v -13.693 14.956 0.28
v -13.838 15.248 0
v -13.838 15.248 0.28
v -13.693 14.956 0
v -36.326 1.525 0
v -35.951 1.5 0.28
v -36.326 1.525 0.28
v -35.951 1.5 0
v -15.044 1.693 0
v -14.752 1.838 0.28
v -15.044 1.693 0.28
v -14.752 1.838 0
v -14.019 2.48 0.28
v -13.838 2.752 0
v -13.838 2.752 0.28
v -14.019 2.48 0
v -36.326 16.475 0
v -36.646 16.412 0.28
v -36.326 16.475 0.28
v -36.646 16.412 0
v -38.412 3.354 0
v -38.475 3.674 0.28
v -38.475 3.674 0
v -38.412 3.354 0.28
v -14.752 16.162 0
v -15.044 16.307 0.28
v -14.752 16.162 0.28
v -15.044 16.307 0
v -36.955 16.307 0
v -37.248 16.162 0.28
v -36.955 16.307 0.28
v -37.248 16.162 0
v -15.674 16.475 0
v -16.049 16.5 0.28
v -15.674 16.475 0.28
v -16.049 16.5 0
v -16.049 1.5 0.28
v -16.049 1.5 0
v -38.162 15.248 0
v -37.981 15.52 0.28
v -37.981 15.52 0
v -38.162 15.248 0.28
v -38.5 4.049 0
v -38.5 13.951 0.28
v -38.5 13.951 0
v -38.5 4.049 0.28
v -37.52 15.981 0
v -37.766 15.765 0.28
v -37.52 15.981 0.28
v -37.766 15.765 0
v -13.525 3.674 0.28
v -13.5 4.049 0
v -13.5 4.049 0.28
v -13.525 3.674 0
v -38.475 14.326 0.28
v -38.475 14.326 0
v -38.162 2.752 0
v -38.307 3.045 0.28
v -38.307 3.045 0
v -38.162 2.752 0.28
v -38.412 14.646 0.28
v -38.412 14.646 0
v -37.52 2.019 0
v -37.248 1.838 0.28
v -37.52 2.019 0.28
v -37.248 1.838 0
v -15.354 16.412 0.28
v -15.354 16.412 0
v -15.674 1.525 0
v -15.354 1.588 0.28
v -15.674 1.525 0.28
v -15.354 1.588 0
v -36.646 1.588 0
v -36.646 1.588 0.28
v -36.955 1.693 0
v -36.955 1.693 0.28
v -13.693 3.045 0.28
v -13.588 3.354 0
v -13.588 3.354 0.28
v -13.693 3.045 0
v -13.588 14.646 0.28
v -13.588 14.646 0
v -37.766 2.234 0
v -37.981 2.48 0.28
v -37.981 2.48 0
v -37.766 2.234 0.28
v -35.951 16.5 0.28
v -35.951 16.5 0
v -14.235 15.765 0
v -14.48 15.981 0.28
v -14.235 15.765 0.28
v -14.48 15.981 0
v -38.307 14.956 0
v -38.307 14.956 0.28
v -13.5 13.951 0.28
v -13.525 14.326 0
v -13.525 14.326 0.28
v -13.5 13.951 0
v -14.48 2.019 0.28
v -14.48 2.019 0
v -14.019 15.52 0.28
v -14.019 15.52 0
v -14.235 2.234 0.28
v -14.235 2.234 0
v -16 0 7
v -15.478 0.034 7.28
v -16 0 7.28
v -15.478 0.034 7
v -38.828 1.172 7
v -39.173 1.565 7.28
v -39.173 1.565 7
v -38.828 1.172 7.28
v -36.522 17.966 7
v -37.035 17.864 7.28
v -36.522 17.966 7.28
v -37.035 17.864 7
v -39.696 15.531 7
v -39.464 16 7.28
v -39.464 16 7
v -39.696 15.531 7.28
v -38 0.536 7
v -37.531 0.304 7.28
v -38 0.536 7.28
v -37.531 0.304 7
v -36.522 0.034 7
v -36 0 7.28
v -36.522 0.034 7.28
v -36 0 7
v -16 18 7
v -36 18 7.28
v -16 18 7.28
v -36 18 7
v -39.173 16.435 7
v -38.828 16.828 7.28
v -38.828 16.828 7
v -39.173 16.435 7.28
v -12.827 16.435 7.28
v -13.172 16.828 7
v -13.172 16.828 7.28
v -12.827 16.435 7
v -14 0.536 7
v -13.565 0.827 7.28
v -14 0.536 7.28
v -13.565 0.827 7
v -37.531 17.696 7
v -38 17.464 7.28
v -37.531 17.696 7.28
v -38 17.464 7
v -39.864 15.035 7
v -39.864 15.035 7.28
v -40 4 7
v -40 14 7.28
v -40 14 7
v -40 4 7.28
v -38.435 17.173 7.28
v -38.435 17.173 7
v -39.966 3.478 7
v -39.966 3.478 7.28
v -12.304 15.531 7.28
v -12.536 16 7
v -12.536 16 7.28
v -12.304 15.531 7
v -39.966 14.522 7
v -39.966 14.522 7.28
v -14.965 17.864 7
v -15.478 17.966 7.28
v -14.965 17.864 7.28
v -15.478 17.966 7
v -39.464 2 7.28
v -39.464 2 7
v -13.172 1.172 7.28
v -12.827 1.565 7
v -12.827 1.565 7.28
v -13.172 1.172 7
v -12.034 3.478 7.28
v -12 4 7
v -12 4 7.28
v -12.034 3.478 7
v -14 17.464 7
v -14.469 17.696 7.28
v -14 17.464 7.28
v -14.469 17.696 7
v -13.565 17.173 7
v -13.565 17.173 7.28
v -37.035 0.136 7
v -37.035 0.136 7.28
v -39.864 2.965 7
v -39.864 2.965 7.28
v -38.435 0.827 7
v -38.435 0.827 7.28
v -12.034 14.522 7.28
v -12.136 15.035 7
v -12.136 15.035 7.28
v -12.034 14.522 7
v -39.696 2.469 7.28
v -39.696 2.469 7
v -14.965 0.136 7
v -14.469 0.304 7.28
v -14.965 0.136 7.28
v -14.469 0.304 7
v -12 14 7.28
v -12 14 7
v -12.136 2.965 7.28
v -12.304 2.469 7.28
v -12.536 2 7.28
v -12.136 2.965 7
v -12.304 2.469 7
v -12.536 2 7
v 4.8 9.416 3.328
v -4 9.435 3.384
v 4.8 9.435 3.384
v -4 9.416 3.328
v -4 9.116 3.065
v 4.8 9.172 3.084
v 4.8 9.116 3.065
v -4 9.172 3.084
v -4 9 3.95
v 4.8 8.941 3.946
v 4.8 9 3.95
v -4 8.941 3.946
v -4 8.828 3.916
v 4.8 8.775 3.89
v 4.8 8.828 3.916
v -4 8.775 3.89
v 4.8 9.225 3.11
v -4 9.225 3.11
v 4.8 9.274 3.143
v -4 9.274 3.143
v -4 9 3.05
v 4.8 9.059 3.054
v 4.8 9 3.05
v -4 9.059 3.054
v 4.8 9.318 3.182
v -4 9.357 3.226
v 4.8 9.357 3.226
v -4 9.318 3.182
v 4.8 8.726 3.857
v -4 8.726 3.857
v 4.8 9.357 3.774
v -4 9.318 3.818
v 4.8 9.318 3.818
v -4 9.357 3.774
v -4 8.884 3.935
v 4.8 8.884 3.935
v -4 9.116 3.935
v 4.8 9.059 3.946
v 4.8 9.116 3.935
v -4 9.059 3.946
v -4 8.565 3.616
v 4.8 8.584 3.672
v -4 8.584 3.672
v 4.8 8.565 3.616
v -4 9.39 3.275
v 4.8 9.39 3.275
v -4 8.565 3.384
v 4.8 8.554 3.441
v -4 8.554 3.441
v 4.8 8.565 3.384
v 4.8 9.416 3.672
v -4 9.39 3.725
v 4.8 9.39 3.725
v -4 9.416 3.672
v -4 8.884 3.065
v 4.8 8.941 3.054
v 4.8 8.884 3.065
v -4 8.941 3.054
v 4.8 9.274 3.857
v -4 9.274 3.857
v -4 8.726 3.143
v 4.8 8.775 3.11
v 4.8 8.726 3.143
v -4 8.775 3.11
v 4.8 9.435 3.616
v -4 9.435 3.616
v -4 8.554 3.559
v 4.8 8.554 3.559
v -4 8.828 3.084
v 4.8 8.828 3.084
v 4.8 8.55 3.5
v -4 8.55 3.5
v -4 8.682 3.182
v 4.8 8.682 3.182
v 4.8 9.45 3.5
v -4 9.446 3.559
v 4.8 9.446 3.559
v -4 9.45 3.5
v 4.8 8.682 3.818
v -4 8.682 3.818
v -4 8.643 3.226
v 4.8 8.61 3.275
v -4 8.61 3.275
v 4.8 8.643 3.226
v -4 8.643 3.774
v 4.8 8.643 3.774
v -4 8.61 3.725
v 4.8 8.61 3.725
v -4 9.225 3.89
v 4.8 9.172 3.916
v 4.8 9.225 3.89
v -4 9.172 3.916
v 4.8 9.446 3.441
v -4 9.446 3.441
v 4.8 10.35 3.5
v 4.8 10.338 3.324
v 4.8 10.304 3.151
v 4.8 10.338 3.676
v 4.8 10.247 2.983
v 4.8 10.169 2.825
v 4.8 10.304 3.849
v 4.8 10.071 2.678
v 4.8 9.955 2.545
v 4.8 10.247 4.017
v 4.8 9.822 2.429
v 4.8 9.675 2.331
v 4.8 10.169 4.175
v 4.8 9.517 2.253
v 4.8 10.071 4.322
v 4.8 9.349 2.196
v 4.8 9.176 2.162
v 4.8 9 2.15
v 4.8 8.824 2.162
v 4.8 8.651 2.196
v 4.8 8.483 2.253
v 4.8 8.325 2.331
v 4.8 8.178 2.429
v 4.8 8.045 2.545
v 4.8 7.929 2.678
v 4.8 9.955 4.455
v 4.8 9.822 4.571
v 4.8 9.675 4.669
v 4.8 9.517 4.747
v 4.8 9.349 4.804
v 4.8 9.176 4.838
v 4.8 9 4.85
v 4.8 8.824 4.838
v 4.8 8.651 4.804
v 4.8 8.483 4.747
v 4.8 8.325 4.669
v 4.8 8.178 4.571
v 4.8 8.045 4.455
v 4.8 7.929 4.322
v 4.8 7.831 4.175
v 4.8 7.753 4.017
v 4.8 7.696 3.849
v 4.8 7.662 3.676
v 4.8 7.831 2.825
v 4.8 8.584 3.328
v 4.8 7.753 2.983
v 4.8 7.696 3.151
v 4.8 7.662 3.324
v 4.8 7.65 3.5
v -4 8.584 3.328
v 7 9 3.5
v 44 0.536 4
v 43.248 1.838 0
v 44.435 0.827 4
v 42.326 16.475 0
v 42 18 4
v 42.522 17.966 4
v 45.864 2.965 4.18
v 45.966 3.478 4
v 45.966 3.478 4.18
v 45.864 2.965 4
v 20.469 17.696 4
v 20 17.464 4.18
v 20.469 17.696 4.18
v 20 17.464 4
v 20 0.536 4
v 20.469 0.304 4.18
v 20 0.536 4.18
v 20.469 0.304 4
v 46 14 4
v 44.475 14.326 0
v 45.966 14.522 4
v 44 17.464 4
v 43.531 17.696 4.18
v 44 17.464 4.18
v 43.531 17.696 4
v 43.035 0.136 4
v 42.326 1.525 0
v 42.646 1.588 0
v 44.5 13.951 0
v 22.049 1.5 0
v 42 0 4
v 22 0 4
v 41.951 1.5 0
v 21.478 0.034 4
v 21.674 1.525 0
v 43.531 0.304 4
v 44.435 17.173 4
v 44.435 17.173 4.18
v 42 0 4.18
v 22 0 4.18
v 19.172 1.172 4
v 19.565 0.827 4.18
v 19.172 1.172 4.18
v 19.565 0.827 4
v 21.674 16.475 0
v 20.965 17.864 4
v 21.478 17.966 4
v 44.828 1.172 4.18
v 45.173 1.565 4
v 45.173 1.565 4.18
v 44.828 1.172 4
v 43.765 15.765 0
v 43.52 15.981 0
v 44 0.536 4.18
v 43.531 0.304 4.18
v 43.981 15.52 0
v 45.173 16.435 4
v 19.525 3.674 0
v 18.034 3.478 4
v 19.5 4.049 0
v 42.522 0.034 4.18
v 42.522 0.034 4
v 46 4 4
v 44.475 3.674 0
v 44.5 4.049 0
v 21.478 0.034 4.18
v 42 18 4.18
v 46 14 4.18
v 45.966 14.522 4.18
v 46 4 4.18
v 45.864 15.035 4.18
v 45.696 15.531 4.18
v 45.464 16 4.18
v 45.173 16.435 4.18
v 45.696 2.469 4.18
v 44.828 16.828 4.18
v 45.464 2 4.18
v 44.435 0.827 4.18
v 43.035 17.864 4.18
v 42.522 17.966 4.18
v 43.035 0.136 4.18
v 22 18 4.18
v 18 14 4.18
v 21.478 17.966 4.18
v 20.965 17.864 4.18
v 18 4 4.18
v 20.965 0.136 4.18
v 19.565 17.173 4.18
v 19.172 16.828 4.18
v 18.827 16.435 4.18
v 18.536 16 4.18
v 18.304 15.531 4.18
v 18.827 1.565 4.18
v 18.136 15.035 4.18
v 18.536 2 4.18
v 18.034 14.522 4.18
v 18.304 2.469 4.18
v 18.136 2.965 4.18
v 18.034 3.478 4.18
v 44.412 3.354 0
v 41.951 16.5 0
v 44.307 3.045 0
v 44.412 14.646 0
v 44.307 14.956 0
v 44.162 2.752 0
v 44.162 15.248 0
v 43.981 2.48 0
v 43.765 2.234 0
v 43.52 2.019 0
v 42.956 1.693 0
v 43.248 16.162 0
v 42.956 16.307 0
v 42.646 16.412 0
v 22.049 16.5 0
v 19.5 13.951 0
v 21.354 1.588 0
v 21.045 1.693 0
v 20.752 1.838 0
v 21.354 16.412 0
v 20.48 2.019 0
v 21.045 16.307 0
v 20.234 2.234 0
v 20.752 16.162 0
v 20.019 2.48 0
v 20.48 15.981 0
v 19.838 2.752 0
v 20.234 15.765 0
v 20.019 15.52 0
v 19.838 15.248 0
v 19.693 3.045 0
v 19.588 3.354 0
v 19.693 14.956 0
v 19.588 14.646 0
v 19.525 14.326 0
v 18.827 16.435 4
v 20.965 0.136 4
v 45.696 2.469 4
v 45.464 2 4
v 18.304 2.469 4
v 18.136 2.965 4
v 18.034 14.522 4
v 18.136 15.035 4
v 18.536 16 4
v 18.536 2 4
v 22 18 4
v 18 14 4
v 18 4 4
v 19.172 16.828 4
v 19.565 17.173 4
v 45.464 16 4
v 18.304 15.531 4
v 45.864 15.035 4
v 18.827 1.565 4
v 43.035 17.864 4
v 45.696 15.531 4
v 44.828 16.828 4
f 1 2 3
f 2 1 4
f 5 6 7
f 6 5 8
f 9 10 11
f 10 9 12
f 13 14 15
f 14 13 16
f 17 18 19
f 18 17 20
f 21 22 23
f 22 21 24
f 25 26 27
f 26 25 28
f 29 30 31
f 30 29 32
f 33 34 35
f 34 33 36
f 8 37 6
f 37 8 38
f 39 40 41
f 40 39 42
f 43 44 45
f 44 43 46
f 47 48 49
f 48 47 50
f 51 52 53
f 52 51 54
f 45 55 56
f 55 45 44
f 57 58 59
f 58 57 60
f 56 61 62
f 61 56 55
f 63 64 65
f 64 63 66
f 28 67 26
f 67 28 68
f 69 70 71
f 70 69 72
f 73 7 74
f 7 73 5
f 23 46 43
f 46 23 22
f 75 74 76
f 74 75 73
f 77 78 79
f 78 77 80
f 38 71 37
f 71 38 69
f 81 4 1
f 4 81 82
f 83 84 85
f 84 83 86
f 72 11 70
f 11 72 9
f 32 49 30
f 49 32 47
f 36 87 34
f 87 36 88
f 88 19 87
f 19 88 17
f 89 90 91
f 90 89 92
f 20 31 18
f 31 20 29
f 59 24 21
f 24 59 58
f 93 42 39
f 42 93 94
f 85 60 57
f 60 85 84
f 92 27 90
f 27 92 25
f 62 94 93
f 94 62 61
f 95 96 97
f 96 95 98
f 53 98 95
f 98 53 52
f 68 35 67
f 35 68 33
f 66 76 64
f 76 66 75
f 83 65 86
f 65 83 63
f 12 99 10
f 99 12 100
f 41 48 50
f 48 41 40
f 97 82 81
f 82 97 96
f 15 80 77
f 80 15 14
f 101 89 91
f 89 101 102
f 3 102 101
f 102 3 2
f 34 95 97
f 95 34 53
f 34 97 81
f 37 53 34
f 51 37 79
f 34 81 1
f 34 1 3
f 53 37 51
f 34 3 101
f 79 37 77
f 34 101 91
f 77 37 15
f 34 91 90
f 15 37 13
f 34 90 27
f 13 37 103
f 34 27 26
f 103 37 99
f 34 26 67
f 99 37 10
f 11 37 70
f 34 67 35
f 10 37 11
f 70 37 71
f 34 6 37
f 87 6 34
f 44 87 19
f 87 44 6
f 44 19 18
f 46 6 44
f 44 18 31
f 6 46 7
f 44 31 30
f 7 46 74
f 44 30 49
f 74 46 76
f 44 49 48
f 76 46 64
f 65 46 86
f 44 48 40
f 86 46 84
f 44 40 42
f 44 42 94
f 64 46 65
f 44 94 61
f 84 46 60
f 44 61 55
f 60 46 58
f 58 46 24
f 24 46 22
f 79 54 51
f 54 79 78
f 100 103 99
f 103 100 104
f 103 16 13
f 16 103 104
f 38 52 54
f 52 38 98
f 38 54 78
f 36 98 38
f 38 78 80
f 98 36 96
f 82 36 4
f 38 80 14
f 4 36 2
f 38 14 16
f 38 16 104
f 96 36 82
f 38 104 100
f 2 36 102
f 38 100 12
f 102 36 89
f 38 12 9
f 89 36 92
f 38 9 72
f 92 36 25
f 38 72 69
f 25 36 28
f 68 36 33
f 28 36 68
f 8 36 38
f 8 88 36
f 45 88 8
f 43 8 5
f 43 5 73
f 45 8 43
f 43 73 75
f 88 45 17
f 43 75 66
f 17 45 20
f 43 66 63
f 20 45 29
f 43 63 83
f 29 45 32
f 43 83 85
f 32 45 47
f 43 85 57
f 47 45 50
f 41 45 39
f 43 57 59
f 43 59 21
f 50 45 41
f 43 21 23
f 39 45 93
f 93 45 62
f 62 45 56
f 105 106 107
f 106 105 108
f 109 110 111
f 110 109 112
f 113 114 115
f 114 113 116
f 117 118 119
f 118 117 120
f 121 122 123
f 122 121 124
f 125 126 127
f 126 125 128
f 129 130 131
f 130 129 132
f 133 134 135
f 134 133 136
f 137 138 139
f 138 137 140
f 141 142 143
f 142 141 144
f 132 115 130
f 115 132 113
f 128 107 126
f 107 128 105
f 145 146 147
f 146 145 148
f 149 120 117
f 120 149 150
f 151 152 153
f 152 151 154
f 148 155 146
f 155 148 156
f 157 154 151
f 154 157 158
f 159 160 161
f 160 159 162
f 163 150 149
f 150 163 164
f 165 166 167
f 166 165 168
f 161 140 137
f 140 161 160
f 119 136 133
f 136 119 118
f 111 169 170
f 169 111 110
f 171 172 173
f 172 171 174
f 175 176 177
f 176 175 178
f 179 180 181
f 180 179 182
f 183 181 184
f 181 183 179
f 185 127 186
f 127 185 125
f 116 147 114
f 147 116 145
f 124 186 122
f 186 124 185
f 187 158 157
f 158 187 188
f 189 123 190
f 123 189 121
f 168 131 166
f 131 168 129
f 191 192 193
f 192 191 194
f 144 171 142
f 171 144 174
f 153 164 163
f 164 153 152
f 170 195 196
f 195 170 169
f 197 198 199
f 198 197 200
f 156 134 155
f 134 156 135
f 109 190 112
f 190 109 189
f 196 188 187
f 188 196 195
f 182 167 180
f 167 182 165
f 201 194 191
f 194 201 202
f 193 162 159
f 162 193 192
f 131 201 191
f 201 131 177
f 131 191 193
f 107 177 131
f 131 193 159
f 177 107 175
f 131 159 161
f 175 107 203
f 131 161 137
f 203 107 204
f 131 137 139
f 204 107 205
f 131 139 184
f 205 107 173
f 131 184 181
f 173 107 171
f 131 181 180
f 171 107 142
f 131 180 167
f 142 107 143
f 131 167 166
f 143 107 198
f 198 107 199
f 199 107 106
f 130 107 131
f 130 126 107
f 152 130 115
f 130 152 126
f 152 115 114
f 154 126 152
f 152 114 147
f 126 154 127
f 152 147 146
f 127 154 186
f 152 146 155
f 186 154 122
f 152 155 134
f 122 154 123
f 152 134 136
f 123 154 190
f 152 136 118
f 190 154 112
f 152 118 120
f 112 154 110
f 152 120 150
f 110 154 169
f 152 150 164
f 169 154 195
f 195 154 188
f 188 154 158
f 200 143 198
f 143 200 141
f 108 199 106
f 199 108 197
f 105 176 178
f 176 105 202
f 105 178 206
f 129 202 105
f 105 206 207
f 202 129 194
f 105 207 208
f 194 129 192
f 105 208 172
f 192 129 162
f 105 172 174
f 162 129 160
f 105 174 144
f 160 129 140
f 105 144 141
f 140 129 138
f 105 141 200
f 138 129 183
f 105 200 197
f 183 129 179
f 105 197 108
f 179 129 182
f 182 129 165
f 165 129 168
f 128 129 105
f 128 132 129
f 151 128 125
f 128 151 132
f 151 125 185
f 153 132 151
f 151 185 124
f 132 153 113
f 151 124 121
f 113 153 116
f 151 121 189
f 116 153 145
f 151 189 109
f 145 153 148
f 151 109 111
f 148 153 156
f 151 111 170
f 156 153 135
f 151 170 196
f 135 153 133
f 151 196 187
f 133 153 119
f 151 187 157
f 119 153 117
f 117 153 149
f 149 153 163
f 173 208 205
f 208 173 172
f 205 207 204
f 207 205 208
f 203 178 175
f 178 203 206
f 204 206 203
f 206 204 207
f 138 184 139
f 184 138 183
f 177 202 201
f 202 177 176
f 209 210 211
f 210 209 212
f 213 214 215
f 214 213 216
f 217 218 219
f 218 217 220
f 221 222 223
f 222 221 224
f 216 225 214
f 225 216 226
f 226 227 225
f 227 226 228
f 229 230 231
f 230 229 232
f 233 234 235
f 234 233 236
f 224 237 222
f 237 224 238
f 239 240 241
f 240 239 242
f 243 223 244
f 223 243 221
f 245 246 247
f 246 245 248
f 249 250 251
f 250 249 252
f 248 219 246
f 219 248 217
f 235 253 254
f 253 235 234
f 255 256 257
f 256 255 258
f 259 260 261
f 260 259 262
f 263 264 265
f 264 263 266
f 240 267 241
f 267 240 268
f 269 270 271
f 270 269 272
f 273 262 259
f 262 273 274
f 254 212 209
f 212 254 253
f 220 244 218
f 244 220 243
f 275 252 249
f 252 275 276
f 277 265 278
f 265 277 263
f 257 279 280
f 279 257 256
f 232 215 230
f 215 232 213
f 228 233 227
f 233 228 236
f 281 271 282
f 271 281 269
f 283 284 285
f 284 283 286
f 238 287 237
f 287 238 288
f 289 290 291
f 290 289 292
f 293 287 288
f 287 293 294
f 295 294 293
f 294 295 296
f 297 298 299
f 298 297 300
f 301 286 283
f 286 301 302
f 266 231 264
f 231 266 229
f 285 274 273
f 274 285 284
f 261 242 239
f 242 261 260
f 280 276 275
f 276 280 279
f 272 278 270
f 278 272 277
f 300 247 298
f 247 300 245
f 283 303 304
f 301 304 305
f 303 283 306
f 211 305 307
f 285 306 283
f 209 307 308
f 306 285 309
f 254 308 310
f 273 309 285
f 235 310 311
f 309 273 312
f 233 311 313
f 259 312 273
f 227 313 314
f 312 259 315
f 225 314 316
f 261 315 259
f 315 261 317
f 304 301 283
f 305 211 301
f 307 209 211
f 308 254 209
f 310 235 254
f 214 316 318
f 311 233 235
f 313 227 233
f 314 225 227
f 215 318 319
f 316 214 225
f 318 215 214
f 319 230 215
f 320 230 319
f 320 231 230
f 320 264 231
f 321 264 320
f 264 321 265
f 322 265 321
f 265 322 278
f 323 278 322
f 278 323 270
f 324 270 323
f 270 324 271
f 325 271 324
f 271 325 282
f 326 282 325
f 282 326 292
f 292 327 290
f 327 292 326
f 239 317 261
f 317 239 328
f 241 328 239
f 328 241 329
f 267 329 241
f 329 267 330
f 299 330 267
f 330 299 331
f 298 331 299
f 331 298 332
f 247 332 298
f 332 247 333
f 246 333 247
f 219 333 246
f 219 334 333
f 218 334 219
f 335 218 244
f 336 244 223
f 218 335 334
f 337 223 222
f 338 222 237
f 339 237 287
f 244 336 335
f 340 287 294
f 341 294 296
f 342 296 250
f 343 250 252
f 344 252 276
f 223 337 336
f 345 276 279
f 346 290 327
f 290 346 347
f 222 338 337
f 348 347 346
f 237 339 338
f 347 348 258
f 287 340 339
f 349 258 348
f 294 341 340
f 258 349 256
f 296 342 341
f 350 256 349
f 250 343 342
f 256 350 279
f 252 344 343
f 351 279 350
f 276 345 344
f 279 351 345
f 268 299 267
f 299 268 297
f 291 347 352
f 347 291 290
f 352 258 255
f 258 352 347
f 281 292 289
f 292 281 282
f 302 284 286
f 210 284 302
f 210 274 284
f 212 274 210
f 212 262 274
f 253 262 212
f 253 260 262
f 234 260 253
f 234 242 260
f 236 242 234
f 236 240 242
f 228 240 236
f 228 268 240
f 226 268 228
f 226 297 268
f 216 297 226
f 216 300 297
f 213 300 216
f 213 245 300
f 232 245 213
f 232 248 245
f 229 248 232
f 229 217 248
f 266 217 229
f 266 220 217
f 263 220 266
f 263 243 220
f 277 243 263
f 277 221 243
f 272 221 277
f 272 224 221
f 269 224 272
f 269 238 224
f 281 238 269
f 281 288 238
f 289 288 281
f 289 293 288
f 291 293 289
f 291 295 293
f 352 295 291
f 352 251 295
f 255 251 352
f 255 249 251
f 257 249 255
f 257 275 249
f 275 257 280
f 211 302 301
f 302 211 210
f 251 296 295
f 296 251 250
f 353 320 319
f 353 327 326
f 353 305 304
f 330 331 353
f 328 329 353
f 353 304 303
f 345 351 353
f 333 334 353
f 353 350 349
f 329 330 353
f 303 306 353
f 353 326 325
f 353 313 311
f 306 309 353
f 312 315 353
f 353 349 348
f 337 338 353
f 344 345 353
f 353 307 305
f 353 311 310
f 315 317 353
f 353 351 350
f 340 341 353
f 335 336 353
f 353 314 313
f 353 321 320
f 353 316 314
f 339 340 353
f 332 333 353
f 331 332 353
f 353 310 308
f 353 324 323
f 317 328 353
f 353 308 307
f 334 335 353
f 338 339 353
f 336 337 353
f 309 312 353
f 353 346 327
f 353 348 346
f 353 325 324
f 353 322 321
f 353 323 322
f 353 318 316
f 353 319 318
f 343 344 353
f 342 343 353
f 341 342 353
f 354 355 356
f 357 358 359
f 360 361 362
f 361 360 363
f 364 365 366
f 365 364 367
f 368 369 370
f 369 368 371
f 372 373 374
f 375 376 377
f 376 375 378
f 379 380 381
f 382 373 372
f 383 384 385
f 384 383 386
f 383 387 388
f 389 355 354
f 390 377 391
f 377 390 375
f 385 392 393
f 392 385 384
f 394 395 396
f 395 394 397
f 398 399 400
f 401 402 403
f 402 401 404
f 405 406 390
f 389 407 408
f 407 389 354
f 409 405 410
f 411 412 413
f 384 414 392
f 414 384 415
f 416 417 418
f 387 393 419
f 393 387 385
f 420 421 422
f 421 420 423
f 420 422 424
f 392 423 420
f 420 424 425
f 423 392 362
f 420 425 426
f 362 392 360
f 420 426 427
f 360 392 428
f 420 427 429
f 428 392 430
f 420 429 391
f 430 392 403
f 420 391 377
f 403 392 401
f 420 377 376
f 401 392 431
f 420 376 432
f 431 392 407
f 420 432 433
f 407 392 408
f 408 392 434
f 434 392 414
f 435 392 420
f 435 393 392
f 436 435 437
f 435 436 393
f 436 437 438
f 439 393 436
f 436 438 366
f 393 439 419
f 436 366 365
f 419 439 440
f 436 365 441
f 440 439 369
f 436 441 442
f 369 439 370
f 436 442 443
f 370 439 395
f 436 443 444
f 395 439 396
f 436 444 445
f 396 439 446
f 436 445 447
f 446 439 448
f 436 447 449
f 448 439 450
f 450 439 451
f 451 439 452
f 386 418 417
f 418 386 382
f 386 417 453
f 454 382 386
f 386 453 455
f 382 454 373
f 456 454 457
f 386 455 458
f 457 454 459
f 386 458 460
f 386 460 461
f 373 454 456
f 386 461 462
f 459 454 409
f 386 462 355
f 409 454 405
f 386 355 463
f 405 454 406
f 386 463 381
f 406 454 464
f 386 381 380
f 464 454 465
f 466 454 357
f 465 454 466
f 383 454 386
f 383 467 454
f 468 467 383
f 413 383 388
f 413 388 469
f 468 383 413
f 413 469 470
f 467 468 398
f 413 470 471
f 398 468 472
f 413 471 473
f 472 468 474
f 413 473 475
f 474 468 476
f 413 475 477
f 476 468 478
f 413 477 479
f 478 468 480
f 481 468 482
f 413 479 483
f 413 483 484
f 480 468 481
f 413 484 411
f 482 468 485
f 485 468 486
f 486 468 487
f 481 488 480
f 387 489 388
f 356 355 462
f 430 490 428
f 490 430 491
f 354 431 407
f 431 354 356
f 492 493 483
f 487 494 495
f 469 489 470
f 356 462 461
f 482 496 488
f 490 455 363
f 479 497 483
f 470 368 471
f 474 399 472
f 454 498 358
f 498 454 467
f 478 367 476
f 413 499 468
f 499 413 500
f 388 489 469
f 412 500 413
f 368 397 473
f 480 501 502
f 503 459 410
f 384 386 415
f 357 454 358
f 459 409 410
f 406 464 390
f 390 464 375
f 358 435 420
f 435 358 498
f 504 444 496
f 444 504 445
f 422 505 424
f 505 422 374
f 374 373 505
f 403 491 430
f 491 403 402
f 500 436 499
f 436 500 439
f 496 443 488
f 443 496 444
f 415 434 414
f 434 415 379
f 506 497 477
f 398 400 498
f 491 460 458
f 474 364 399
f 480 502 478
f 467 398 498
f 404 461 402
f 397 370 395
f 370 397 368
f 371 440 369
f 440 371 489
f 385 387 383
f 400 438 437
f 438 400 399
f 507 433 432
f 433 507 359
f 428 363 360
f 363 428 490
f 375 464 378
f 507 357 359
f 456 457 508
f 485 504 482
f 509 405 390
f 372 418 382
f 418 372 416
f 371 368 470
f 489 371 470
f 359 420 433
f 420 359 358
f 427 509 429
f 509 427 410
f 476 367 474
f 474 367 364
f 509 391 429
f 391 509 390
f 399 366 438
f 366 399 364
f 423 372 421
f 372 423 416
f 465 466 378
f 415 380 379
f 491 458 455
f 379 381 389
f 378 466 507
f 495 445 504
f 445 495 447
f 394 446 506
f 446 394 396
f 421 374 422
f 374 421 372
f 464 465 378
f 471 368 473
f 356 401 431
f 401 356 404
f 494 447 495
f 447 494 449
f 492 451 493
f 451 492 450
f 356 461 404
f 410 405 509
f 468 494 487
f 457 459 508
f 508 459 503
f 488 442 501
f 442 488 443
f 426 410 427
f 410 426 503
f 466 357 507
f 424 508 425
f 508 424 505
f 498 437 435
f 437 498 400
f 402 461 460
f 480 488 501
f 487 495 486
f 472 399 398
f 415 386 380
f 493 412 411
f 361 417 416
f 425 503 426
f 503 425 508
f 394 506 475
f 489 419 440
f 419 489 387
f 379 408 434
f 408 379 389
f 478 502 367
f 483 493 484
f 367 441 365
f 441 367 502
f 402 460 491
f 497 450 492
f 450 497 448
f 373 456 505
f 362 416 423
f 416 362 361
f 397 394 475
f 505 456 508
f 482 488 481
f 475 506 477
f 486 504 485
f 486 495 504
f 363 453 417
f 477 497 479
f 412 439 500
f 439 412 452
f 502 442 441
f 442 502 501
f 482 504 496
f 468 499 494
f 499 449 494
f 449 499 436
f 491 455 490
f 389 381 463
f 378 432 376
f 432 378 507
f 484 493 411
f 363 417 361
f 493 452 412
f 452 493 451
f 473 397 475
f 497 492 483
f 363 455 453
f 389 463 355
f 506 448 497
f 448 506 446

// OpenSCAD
// OpenSCAD design concepts — visual examples.
//
// Each illustration is deliberately simple. Whenever possible it shows
// INPUT on the left and RESULT on the right so the operation can be read
// from the picture before reading the text.

$fn = 48;

concept_step = "01_keep"; // [01_keep,02_cut,03_clip,04_hull_keep,05_hull_cut,06_convexity,07_decompose]

module rounded_box_2d(w=28, d=18, r=4) {
    hull()
        for (x=[r, w-r], y=[r, d-r])
            translate([x,y]) circle(r);
}

module thin_profile(z, scale_delta=0, h=0.18) {
    translate([0,0,z])
        linear_extrude(h)
            offset(delta=scale_delta)
                rounded_box_2d();
}

module chamfer_body() {
    hull() {
        thin_profile(0, -1.5);
        thin_profile(4, 0);
    }
}

module arrow_x(length=11) {
    color([0.25,0.25,0.25]) {
        rotate([0,90,0])
            cylinder(h=length-2.2, r=0.45);
        translate([length-2.2,0,0])
            rotate([0,90,0])
                cylinder(h=2.2, r1=1.35, r2=0);
    }
}

module concept_keep() {
    // LEFT: the two profiles we start from, pulled apart so both are obvious.
    translate([-40,0,0]) {
        color([0.95,0.55,0.18])
            thin_profile(0, -1.5, 0.28);
        color([0.20,0.55,0.90])
            thin_profile(7, 0, 0.28);
    }

    translate([-4,9,3.5])
        arrow_x(11);

    // RIGHT: the material produced by joining the profiles is kept.
    translate([18,0,0])
        color([0.25,0.70,0.40])
            chamfer_body();
}

module concept_cut() {
    // LEFT: body plus red volume that describes what must disappear.
    translate([-42,0,0]) {
        color([0.65,0.70,0.76])
            cube([30,22,10]);
        color([0.90,0.25,0.20])
            translate([15,11,-1])
                cylinder(h=12, r=4.5);
    }

    translate([-5,11,5])
        arrow_x(11);

    // RIGHT: difference() result.
    translate([20,0,0])
        color([0.25,0.70,0.40])
            difference() {
                cube([30,22,10]);
                translate([15,11,-1])
                    cylinder(h=12, r=4.5);
            }
}

module concept_clip() {
    // LEFT: orange part is too long; blue box is the allowed final region.
    translate([-44,0,0]) {
        color([0.95,0.55,0.18])
            translate([-6,0,0])
                cube([42,16,8]);
        color([0.20,0.55,0.90,0.42])
            cube([30,16,10]);
    }

    translate([-3,8,4])
        arrow_x(11);

    // RIGHT: only the overlap remains.
    translate([20,0,0])
        color([0.25,0.70,0.40])
            intersection() {
                translate([-6,0,0]) cube([42,16,8]);
                cube([30,16,10]);
            }
}

module concept_hull_keep() {
    // LEFT: the hull inputs.
    translate([-40,0,0]) {
        color([0.95,0.55,0.18])
            thin_profile(0, -1.5, 0.28);
        color([0.20,0.55,0.90])
            thin_profile(7, 0, 0.28);
    }

    translate([-4,9,3.5])
        arrow_x(11);

    // RIGHT: the hull itself is the wanted body.
    translate([18,0,0])
        color([0.25,0.70,0.40])
            chamfer_body();
}

module inner_profile_2d(w=20,d=12,r=3) {
    translate([4,3])
        hull()
            for (x=[r,w-r], y=[r,d-r])
                translate([x,y]) circle(r);
}

module inner_layer(z, expansion=0, h=0.18) {
    translate([0,0,z])
        linear_extrude(h)
            offset(delta=expansion)
                inner_profile_2d();
}

module chamfer_cutter() {
    hull() {
        inner_layer(0, 1.5);
        inner_layer(4, 0);
    }
}

module hollow_body_with_chamfer() {
    difference() {
        cube([30,20,8]);

        // Normal opening continues through the whole body.
        translate([0,0,-1])
            linear_extrude(10)
                inner_profile_2d();

        // The tapered cutter enlarges the opening only near the end face.
        chamfer_cutter();
    }
}

module concept_hull_cut() {
    // LEFT: two opening profiles.
    translate([-55,0,0]) {
        color([0.95,0.55,0.18])
            inner_layer(0, 1.5, 0.28);
        color([0.20,0.55,0.90])
            inner_layer(7, 0, 0.28);
    }

    translate([-27,9,3.5])
        arrow_x(9);

    // MIDDLE: hull turns them into a solid cutter.
    translate([-12,0,0])
        color([0.90,0.25,0.20])
            chamfer_cutter();

    translate([18,9,3.5])
        arrow_x(9);

    // RIGHT: subtract the normal opening and the cutter from the body.
    translate([34,0,0])
        color([0.25,0.70,0.40])
            hollow_body_with_chamfer();
}

module l_2d(size=24, wall=7) {
    union() {
        square([size,wall]);
        square([wall,size]);
    }
}

module concept_convexity() {
    // LEFT: convex rounded rectangle. Hull follows the expected boundary.
    translate([-34,0,0]) {
        color([0.25,0.70,0.40,0.90])
            hull() {
                translate([0,0,0])
                    linear_extrude(0.2)
                        offset(delta=-1.3)
                            rounded_box_2d(26,18,4);
                translate([0,0,4])
                    linear_extrude(0.2)
                        rounded_box_2d(26,18,4);
            }
    }

    // RIGHT: concave L. Red hull bridges the missing inside corner.
    translate([20,0,0]) {
        color([0.65,0.70,0.76,0.50])
            translate([0,0,4])
                linear_extrude(0.25)
                    l_2d();

        color([0.90,0.25,0.20,0.72])
            hull() {
                translate([0,0,0])
                    linear_extrude(0.2)
                        offset(delta=-1)
                            l_2d();
                translate([0,0,4])
                    linear_extrude(0.2)
                        l_2d();
            }

        // The translucent box marks the quadrant that should remain open.
        color([0.20,0.55,0.90,0.18])
            translate([7,7,-0.2])
                cube([17,17,4.6]);
    }
}

module base_with_main_void(length=26) {
    difference() {
        cube([length,16,8]);
        translate([6,4,-1])
            cube([12,8,10]);
    }
}

module base_with_local_cut(length=26) {
    difference() {
        base_with_main_void(length);
        translate([length-2,8,6])
            rotate([0,45,0])
                cube([8,5,5], center=true);
    }
}

module concept_decompose() {
    // 1: start with an easy outside body.
    translate([-63,0,0])
        color([0.25,0.70,0.40])
            cube([26,16,8]);

    translate([-33,8,4])
        arrow_x(7);

    // 2: subtract the main void.
    translate([-21,0,0])
        color([0.25,0.70,0.40])
            base_with_main_void();

    translate([9,8,4])
        arrow_x(7);

    // 3: subtract a small local detail.
    translate([21,0,0])
        color([0.25,0.70,0.40])
            base_with_local_cut();

    translate([51,8,4])
        arrow_x(7);

    // 4: trim the overlong end to the final length.
    translate([63,0,0])
        color([0.25,0.70,0.40])
            intersection() {
                base_with_local_cut();
                cube([22,16,10]);
            }
}

if (concept_step == "01_keep")
    concept_keep();
else if (concept_step == "02_cut")
    concept_cut();
else if (concept_step == "03_clip")
    concept_clip();
else if (concept_step == "04_hull_keep")
    concept_hull_keep();
else if (concept_step == "05_hull_cut")
    concept_hull_cut();
else if (concept_step == "06_convexity")
    concept_convexity();
else
    concept_decompose();
